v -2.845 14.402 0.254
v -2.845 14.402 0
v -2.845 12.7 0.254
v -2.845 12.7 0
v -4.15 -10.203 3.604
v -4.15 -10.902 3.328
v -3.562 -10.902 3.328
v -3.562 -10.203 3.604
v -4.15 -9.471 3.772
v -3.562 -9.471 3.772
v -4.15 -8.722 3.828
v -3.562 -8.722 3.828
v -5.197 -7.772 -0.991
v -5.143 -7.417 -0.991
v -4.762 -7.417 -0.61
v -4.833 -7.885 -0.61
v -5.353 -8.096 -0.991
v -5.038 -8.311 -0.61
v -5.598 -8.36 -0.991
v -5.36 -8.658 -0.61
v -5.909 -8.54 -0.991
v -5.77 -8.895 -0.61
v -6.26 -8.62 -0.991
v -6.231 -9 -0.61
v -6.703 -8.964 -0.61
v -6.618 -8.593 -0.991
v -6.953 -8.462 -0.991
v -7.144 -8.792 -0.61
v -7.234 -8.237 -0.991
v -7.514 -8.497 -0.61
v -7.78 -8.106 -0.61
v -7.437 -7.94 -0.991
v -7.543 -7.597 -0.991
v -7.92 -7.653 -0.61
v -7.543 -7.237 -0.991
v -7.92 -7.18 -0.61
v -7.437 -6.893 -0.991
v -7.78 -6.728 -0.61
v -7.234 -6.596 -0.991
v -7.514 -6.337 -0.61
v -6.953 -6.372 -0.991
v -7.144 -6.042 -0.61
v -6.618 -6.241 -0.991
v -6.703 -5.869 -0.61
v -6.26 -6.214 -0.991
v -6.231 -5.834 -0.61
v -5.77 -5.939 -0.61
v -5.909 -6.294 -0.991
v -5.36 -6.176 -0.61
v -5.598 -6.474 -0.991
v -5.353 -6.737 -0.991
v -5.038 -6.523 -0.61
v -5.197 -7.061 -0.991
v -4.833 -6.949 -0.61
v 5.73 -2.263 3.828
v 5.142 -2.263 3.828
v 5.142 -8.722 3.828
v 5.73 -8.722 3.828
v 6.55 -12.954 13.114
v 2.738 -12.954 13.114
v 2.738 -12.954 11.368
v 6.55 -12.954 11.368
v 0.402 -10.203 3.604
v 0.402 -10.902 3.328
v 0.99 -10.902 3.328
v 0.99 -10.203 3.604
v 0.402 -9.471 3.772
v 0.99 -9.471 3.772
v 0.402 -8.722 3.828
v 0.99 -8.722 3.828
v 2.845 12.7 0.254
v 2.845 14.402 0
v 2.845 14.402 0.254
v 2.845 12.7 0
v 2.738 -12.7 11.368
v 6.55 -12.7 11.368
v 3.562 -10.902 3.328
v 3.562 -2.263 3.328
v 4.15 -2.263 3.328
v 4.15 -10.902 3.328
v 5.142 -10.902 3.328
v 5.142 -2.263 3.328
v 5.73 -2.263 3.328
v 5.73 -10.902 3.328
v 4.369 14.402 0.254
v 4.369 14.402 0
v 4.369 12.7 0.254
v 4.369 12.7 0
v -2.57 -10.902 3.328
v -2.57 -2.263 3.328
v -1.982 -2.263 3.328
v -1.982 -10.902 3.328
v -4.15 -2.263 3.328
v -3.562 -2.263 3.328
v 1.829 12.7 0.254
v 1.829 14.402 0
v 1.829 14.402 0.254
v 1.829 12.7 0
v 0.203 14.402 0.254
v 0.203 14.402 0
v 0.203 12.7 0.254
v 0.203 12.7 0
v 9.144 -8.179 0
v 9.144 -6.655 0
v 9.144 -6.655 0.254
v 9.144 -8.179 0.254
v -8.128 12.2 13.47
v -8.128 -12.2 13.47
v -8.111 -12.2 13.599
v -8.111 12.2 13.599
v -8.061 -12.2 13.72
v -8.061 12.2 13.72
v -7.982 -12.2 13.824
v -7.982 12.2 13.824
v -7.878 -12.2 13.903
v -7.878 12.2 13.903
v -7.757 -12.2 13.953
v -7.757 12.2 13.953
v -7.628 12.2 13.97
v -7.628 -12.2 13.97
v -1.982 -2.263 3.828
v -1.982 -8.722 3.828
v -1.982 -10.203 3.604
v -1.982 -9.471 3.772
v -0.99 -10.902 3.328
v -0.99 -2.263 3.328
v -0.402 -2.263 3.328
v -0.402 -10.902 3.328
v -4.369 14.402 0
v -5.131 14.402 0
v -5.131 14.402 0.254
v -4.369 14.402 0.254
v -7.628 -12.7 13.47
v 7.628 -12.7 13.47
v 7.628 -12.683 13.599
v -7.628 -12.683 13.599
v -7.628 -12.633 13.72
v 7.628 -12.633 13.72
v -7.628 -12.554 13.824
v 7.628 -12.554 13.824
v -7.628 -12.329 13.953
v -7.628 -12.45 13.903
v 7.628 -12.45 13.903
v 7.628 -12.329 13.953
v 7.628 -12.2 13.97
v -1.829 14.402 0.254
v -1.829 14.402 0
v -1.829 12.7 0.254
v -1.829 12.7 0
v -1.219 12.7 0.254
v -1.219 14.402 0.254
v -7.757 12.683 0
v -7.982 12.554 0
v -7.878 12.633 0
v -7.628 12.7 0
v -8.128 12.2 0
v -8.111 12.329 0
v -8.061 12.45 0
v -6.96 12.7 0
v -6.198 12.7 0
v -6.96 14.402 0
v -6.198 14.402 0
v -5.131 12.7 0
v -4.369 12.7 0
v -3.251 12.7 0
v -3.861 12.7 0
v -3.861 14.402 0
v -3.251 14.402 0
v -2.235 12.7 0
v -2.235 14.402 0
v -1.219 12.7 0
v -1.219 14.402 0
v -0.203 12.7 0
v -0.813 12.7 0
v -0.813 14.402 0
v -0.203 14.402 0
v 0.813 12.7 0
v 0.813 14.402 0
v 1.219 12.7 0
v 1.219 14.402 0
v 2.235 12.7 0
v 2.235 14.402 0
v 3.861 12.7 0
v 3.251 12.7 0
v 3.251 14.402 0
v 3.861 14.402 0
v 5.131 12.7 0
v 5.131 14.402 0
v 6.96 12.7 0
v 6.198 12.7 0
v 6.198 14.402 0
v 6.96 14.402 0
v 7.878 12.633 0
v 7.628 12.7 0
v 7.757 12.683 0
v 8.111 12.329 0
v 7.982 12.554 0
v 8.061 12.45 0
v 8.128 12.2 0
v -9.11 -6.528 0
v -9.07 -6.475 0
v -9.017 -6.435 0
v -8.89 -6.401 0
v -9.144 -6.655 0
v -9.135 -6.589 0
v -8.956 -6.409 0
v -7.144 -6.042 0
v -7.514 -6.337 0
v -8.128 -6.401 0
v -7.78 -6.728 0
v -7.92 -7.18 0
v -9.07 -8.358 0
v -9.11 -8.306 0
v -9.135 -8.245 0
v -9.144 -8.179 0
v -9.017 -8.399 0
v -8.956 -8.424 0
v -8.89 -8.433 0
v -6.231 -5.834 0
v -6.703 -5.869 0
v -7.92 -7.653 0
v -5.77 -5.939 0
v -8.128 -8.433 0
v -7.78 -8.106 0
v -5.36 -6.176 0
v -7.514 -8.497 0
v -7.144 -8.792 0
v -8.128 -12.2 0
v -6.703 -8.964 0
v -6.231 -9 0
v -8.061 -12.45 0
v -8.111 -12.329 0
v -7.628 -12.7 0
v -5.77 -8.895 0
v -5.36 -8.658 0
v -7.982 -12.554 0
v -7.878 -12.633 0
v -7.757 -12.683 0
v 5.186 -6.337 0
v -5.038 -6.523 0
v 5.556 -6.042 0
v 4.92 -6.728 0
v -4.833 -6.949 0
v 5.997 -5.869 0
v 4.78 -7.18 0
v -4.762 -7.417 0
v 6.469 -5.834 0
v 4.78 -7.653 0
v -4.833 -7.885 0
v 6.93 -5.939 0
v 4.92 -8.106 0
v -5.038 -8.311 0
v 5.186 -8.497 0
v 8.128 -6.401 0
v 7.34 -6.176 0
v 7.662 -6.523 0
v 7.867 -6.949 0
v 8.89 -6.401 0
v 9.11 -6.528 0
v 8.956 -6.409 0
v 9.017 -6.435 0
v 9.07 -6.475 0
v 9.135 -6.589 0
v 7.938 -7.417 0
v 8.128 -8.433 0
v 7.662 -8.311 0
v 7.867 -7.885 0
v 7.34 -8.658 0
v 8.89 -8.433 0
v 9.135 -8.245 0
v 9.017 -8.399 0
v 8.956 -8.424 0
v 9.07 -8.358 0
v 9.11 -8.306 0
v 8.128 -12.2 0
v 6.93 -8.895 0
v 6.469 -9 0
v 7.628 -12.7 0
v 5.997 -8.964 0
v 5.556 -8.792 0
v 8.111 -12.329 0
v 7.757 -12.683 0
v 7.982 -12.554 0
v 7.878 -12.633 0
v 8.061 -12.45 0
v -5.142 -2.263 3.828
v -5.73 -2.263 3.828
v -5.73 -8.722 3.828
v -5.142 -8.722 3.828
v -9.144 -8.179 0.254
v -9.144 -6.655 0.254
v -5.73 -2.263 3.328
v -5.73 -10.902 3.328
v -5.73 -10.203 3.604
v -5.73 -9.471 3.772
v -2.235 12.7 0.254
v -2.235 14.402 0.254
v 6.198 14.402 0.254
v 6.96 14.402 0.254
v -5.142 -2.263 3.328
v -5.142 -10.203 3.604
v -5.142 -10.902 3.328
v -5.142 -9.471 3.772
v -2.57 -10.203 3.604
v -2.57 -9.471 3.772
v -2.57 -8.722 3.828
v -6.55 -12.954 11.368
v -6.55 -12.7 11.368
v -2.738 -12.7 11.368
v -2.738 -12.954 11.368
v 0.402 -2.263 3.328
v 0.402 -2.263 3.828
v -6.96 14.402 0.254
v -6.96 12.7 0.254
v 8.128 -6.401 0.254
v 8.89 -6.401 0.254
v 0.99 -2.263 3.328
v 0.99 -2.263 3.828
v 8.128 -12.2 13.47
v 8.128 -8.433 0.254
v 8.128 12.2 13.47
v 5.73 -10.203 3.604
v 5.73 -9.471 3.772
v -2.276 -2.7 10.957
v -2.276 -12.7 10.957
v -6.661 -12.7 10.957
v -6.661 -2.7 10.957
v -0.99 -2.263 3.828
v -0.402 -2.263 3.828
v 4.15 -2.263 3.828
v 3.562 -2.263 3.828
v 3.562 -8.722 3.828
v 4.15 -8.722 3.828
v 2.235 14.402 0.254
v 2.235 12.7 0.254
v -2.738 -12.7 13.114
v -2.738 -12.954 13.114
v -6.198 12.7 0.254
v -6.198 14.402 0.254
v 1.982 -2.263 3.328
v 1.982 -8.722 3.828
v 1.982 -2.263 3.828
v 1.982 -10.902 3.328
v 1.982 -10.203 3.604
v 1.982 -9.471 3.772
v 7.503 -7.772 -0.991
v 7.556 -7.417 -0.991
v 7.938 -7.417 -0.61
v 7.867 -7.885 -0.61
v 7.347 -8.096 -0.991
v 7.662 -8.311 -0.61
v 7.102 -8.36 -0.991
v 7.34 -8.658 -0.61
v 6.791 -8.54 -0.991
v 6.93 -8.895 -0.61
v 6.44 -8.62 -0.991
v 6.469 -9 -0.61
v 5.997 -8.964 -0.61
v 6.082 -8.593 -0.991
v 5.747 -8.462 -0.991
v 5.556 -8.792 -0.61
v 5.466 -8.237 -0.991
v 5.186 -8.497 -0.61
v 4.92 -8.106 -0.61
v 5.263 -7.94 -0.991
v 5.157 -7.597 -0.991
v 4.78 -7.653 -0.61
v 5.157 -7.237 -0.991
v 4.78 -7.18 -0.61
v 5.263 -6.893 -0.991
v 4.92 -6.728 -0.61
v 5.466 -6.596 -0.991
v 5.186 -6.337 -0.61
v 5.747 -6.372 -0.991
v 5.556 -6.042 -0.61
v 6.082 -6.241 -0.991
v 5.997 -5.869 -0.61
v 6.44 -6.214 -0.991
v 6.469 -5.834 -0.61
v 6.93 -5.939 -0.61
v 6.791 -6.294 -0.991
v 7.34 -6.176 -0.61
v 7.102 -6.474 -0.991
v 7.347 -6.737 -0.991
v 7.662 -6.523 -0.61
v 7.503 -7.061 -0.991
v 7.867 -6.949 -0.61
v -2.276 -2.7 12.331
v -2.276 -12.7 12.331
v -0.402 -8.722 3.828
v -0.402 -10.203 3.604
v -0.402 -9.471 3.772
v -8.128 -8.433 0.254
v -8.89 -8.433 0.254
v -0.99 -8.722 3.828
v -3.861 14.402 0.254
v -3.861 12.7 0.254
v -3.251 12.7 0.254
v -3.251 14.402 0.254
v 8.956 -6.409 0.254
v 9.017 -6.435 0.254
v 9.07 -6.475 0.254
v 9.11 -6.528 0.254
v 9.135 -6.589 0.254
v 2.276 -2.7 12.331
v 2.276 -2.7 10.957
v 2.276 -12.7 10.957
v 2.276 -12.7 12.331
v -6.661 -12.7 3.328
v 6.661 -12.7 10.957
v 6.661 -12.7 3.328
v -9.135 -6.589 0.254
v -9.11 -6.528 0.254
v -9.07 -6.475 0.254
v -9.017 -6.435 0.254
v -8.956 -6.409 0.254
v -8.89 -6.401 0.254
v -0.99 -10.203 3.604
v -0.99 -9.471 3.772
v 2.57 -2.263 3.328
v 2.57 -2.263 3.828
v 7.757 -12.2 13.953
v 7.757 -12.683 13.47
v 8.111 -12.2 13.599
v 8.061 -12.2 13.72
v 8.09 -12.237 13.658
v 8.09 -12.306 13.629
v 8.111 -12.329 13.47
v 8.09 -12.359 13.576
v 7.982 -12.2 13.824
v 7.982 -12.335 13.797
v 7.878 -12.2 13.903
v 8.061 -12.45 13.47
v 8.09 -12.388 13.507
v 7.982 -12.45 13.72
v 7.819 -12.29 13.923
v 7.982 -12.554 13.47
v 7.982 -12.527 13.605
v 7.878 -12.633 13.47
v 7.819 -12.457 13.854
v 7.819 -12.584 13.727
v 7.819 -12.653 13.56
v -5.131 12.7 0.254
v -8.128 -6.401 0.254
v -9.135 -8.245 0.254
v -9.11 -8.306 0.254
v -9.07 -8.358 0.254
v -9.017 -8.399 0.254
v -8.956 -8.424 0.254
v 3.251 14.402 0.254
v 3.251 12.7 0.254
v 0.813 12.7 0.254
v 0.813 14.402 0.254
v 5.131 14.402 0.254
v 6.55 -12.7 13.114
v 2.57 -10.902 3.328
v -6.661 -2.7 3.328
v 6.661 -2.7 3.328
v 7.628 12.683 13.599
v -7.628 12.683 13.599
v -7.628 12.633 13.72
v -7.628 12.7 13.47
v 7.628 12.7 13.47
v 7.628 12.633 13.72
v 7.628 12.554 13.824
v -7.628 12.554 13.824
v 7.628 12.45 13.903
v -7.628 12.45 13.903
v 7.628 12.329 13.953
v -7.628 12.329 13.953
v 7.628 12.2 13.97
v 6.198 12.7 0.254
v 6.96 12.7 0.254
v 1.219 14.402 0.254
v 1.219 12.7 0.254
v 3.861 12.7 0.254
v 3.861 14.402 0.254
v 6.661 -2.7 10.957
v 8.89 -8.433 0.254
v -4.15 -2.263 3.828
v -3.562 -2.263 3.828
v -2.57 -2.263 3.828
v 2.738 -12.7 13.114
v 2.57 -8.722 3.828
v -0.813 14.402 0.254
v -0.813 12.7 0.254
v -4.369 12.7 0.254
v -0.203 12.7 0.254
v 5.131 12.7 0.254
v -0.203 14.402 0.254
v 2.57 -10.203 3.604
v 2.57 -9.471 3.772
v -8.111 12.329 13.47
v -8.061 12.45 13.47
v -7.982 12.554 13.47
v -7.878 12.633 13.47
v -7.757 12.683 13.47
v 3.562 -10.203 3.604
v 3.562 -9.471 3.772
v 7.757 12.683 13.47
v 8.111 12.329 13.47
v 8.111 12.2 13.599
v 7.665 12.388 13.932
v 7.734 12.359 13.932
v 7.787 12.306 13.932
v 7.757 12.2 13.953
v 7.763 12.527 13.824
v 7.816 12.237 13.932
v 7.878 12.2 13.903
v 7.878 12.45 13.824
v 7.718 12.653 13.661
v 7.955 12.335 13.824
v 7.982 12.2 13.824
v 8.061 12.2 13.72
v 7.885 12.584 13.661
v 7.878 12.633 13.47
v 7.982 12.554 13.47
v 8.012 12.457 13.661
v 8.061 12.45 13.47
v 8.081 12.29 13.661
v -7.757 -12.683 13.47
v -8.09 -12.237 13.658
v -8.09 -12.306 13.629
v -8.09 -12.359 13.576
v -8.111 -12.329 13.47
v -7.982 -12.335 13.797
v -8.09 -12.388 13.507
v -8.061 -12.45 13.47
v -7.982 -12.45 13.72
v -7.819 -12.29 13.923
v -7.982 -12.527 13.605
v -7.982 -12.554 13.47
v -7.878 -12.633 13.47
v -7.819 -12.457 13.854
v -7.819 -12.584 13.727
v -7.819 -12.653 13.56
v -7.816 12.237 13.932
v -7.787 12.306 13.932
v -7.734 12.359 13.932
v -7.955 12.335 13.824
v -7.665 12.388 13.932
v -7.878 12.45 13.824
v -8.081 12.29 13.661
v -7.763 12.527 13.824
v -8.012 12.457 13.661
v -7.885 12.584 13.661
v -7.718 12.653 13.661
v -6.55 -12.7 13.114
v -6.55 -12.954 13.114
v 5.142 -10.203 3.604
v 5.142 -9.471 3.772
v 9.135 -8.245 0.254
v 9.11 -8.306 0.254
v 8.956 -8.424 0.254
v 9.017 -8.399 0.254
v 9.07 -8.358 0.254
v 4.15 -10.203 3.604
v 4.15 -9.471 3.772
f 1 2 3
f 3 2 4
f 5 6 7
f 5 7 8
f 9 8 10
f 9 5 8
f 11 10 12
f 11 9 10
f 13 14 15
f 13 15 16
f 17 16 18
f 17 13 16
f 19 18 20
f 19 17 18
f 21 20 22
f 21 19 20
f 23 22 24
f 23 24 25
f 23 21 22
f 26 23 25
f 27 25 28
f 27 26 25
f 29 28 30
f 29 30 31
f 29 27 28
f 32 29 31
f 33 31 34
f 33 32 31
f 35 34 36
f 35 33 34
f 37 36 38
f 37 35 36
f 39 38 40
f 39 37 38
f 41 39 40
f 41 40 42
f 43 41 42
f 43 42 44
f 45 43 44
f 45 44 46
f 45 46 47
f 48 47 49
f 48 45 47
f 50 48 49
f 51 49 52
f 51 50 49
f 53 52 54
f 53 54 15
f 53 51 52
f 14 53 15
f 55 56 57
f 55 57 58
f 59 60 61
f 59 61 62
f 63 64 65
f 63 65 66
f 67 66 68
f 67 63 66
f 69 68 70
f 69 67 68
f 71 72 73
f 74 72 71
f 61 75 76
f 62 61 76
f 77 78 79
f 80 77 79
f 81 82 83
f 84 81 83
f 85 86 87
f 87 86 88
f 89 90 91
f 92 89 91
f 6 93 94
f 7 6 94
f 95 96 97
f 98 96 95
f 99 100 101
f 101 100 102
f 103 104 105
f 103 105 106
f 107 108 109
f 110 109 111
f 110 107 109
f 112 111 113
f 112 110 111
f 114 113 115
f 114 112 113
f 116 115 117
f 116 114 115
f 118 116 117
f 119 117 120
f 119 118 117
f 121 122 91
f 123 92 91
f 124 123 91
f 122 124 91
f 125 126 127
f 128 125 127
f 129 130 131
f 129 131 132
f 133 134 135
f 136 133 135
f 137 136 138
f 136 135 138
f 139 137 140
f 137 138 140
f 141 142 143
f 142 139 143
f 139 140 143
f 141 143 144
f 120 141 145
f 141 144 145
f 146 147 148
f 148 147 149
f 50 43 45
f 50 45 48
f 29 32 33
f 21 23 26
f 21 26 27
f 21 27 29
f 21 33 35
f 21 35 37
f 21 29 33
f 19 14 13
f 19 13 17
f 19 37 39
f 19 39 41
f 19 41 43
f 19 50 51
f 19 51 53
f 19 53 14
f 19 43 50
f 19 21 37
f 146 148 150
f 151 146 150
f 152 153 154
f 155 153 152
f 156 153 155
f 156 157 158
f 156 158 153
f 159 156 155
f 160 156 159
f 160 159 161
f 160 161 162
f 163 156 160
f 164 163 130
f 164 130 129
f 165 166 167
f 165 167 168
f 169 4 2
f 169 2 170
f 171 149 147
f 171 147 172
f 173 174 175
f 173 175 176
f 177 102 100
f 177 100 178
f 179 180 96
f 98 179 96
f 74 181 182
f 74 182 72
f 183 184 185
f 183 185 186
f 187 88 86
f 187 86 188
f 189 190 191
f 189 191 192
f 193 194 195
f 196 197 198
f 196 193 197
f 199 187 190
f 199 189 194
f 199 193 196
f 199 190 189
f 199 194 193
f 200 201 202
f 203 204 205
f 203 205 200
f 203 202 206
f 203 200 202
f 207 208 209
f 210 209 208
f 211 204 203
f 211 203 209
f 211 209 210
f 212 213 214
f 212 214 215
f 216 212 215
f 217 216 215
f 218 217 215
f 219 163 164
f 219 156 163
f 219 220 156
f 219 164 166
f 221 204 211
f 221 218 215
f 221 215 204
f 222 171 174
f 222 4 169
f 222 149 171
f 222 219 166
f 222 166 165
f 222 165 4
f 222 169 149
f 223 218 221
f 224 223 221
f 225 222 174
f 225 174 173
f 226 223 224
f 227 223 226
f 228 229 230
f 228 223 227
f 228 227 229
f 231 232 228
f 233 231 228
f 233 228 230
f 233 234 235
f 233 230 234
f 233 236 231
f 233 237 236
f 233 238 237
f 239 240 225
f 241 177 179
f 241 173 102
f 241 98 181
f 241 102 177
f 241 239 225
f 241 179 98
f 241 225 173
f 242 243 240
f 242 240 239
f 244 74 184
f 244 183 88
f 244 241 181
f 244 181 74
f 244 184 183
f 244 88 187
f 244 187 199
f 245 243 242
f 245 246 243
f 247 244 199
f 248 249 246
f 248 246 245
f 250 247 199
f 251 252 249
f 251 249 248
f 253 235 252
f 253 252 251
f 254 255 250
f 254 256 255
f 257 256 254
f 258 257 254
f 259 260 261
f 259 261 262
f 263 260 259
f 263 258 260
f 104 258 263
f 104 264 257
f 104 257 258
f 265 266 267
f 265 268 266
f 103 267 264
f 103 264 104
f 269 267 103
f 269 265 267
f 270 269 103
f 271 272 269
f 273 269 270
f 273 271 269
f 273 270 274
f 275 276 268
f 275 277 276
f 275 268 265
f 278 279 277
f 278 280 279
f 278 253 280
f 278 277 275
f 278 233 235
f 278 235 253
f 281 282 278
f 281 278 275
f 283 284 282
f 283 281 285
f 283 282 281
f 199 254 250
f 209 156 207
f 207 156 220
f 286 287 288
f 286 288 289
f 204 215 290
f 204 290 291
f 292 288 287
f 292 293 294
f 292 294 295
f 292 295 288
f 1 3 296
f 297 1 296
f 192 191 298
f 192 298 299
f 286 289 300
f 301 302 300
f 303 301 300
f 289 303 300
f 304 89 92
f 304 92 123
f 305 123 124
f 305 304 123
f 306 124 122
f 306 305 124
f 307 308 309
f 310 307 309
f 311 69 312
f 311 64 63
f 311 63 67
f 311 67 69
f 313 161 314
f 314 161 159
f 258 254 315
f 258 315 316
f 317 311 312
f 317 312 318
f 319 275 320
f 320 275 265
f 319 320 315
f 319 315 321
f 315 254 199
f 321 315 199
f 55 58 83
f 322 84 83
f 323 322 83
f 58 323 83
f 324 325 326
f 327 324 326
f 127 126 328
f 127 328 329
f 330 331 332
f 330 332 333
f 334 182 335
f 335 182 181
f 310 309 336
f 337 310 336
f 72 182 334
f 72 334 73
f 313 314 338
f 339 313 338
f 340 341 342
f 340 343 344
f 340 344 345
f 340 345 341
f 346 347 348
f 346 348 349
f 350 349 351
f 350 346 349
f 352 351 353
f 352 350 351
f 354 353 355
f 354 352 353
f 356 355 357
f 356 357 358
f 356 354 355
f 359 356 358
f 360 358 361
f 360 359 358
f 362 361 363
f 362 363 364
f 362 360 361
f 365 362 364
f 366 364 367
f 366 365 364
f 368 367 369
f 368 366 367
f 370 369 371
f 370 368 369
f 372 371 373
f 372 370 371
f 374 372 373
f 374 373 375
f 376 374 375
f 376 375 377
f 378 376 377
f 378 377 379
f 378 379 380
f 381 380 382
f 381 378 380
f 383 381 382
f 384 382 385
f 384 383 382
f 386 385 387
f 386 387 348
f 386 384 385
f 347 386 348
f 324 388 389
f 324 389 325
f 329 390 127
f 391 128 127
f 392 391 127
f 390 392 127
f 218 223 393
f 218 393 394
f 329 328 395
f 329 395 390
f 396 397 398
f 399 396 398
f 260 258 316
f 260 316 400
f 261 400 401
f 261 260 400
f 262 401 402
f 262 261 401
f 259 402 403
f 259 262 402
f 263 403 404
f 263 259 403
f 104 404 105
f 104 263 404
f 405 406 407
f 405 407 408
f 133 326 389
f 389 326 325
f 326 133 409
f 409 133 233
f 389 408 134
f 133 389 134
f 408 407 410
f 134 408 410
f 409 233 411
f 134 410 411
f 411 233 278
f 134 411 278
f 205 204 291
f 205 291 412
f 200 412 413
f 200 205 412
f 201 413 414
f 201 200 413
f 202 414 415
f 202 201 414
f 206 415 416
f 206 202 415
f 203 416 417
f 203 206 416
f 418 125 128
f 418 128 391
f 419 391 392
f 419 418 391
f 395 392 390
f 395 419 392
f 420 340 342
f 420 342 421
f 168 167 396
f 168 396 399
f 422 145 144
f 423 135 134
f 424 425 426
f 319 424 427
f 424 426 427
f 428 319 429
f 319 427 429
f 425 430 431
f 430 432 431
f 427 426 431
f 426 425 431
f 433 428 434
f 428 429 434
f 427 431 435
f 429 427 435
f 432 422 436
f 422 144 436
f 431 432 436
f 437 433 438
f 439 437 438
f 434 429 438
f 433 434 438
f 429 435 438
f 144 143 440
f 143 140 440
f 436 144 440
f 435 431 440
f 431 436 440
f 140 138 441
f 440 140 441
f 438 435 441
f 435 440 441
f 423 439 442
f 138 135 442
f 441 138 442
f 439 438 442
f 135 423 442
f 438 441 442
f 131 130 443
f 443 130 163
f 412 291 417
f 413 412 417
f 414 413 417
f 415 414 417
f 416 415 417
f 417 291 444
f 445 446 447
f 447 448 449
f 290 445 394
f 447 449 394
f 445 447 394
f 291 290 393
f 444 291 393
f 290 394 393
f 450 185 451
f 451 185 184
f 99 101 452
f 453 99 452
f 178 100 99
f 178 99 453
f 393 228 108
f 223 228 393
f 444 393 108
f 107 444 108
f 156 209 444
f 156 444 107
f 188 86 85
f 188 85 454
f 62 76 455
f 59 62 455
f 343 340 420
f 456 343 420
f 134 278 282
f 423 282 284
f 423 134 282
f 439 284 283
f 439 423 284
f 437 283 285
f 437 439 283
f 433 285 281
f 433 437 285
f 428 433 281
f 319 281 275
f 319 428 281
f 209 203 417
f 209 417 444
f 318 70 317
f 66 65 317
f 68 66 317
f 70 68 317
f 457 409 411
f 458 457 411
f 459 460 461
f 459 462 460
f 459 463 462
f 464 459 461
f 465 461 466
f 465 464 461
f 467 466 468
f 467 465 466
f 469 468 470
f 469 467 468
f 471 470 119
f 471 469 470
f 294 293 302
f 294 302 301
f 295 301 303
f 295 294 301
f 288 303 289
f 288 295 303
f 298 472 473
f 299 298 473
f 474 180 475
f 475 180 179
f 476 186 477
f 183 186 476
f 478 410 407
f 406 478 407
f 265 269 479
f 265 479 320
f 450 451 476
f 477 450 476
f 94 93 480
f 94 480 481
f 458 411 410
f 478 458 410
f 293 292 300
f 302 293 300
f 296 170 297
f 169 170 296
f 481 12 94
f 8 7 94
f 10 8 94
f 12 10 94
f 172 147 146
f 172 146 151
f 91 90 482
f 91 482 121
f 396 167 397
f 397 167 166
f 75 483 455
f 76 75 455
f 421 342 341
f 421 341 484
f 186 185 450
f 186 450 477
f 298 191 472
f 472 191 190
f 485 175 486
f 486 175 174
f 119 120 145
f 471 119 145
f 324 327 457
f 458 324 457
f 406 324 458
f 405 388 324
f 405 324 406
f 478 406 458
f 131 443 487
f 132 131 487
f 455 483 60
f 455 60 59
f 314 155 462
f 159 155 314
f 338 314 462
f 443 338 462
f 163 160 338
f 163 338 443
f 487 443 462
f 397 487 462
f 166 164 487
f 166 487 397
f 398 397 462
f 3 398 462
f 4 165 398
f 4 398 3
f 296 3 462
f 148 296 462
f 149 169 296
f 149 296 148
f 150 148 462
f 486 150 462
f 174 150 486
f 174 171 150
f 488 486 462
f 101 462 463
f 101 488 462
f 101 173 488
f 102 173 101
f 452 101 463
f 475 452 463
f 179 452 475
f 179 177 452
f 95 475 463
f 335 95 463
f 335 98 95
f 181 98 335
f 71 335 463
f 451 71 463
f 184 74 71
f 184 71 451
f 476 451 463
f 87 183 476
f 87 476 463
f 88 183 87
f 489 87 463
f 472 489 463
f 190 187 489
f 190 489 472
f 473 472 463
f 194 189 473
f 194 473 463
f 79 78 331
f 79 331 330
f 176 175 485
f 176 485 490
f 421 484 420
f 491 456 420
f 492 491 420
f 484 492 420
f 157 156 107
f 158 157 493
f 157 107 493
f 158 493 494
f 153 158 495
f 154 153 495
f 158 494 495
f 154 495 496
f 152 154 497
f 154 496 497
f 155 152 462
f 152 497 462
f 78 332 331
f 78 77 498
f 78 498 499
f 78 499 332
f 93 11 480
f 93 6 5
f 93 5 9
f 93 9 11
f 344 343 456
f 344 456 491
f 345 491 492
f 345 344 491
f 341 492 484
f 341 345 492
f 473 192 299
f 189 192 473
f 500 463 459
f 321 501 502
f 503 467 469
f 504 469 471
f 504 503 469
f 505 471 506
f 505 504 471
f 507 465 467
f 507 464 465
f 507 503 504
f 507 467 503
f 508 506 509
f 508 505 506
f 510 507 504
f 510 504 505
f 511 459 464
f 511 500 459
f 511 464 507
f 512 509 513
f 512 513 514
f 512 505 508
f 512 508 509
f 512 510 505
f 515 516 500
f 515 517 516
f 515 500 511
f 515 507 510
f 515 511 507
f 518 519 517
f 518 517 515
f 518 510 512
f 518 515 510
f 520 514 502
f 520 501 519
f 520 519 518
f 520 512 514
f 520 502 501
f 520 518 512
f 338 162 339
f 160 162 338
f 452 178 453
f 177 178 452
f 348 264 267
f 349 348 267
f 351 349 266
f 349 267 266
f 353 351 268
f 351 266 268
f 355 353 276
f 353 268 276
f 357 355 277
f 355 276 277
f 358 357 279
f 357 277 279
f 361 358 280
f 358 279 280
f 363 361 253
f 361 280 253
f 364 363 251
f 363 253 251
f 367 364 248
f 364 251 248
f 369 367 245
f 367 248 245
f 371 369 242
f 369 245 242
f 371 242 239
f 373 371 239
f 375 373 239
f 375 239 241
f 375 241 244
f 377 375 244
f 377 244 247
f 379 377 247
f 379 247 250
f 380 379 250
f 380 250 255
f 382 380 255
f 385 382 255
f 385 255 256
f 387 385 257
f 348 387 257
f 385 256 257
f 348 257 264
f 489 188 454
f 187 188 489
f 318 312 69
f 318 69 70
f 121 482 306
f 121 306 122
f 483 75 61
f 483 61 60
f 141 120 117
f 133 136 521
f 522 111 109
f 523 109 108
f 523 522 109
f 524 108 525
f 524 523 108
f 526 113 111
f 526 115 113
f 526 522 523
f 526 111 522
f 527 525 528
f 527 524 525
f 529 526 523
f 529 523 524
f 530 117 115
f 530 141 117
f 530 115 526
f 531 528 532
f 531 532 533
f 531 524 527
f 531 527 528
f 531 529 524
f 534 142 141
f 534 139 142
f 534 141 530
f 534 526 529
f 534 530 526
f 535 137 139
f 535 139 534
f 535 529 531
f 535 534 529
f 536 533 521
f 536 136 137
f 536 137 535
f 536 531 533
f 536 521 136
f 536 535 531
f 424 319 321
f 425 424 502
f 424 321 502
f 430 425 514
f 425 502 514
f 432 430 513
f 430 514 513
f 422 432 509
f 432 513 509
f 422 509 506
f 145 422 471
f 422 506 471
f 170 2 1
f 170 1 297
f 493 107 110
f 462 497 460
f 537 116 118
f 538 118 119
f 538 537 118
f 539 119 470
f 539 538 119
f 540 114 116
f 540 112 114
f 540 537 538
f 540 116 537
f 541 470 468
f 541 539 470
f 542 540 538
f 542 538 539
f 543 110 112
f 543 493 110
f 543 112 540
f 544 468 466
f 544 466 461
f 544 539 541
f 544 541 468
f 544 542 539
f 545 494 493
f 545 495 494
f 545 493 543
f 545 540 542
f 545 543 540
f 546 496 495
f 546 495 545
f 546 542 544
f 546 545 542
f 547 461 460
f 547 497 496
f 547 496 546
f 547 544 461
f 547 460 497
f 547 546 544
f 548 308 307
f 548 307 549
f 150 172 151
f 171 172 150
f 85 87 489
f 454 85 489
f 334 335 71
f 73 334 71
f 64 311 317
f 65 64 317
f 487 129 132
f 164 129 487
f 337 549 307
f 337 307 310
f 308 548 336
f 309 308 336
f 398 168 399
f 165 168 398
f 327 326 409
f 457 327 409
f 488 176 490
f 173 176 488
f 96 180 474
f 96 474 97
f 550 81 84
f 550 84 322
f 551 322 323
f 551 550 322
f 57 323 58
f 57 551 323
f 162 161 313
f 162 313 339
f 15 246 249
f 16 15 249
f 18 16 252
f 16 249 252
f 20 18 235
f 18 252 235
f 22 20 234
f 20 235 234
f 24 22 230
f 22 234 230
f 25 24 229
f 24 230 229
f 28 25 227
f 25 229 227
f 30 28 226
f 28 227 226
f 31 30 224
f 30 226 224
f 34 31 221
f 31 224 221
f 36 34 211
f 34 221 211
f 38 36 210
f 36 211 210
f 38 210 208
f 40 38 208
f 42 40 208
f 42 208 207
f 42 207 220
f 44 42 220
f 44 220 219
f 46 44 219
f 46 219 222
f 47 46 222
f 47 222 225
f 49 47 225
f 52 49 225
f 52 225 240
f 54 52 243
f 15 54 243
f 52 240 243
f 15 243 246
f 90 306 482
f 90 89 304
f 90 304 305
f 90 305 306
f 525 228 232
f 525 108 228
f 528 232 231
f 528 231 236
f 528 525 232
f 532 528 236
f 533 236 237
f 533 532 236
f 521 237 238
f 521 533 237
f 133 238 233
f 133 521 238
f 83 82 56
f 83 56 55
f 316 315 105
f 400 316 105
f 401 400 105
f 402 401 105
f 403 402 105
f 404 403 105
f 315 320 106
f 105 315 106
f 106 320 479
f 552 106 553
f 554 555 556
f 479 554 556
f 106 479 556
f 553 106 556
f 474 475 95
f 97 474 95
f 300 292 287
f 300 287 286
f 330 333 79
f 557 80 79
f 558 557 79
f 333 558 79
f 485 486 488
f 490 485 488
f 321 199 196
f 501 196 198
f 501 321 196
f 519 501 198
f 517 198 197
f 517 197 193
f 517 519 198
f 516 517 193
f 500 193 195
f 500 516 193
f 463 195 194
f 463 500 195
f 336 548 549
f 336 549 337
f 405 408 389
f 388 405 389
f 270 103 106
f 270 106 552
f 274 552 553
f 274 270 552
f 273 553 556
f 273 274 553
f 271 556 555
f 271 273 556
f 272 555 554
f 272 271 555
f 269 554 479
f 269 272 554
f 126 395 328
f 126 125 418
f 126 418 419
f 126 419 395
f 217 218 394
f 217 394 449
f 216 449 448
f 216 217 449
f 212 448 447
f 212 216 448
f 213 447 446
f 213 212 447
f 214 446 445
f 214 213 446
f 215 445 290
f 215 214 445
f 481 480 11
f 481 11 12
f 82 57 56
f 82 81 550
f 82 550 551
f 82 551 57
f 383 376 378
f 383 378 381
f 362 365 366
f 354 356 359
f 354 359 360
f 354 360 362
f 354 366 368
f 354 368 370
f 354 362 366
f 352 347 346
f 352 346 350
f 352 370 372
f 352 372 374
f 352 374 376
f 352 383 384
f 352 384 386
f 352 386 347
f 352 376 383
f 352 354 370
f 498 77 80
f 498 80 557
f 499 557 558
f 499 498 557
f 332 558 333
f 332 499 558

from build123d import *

# Parameters (mm, degrees)
F0_W          = 16.256
F0_H          = 25.4
F1_DEPTH      = 13.97
F2_R          = 0.5
F4_DEPTH      = 10
F5_W          = 0.5874776107
F5_H          = 8.6386585608
F6_DEPTH      = 0.5
F7_T1_DEPTH   = 11.4847249695
F7_2_T1_DEPTH = 11.4847249695
F7_3_T1_DEPTH = 11.4847249695
F7_4_T1_DEPTH = 11.4847249695
F7_5_T1_DEPTH = 11.4847249695
F7_6_T1_DEPTH = 11.4847249695
F7_7_T1_DEPTH = 11.4847249695
F7_8_T1_DEPTH = 11.4847249695
F8_R          = 1.5875
F9_DEPTH      = 0.9906
F10_W         = 0.6096
F10_H         = 1.778
F10_W_2       = 0.762
F11_DEPTH     = 0.254
F12_W         = 3.8125803694
F12_H         = 1.7465446144
F13_DEPTH     = 0.254
F14_SIZE      = 0.381


# Not quite as in the source:
# - a fillet or chamfer that OpenCascade refuses, or shapes differently, is made with other operations: its cross-section is extruded or revolved along the edge and cut away or added


with BuildPart() as f1:
    # F0 (on Top) → F1 (new body)
    with BuildSketch(Plane.XY):
        Rectangle(F0_W, F0_H)
    extrude(amount=F1_DEPTH)

    # F2
    f2_edges = [f1.edges().sort_by_distance(p)[0] for p in [
        (8.128, 12.7, 6.985),
        (-8.128, 12.7, 6.985),
        (0, -12.7, 13.97),
        (-8.128, 0, 13.97),
        (0, 12.7, 13.97),
        (8.128, 0, 13.97),
        (-8.128, -12.7, 6.985),
        (8.128, -12.7, 6.985),
    ]]
    fillet(f2_edges, radius=F2_R)

    # F3 (on face) → F4 (cut)
    with BuildSketch(Plane.XZ.offset(12.7)):
        Polygon((2.2763202433, 12.331135571), (0, 12.331135571), (-2.2763202433, 12.331135571), (-2.2763202433, 10.9573551454), (-6.6607256886, 10.9573551454), (-6.6607256886, 3.3284908859), (0, 3.3284908859), (6.6607256886, 3.3284908859), (6.6607256886, 10.9573551454), (2.2763202433, 10.9573551454), align=None)
    extrude(amount=-F4_DEPTH, mode=Mode.SUBTRACT)

    # F8 (on face) → F9 (join)
    with BuildSketch(Plane(origin=(0, 0, 0), x_dir=(1, 0, 0), z_dir=(0, 0, -1))):
        with Locations((6.35, 7.4168)):
            Circle(F8_R)
        with Locations((-6.35, 7.4168)):
            Circle(F8_R)
    extrude(amount=F9_DEPTH)

    # F10 (on face) → F11 (join)
    with BuildSketch(Plane(origin=(0, 0, 0), x_dir=(1, 0, 0), z_dir=(0, 0, -1))):
        with Locations((0.508, -13.5128)):
            Rectangle(F10_W, F10_H)
        with Locations((1.524, -13.5128)):
            Rectangle(F10_W, F10_H)
        with Locations((2.54, -13.5128)):
            Rectangle(F10_W, F10_H)
        with Locations((3.556, -13.5128)):
            Rectangle(F10_W, F10_H)
        with Locations((4.7498, -13.5128)):
            Rectangle(F10_W_2, F10_H)
        with Locations((6.5786, -13.5128)):
            Rectangle(F10_W_2, F10_H)
        with Locations((-0.508, -13.5128)):
            Rectangle(F10_W, F10_H)
        with Locations((-2.54, -13.5128)):
            Rectangle(F10_W, F10_H)
        with Locations((-1.524, -13.5128)):
            Rectangle(F10_W, F10_H)
        with Locations((-3.556, -13.5128)):
            Rectangle(F10_W, F10_H)
        with Locations((-4.7498, -13.5128)):
            Rectangle(F10_W_2, F10_H)
        with Locations((-6.5786, -13.5128)):
            Rectangle(F10_W_2, F10_H)
        with BuildLine():
            Line((8.89, 8.4328), (8.128, 8.4328))
            Line((8.128, 8.4328), (8.128, 6.4008))
            Line((8.128, 6.4008), (8.89, 6.4008))
            ThreePointArc((8.89, 6.4008), (9.0696051224, 6.4751948776), (9.144, 6.6548))
            Line((9.144, 6.6548), (9.144, 8.1788))
            ThreePointArc((9.144, 8.1788), (9.0696051224, 8.3584051224), (8.89, 8.4328))
        make_face()
        with BuildLine():
            ThreePointArc((-8.89, 8.4328), (-9.0696051224, 8.3584051224), (-9.144, 8.1788))
            Line((-9.144, 8.1788), (-9.144, 6.6548))
            ThreePointArc((-9.144, 6.6548), (-9.0696051224, 6.4751948776), (-8.89, 6.4008))
            Line((-8.89, 6.4008), (-8.128, 6.4008))
            Line((-8.128, 6.4008), (-8.128, 8.4328))
            Line((-8.128, 8.4328), (-8.89, 8.4328))
        make_face()
    extrude(amount=-F11_DEPTH)

    # F14
    f14_edges = [f1.edges().sort_by_distance(p)[0] for p in [
        (4.7625, -7.4168, -0.9906),
        (-7.9375, -7.4168, -0.9906),
    ]]
    chamfer(f14_edges, length=F14_SIZE)


with BuildPart() as f6:
    # F5 (on face) → F6 (new body)
    with BuildSketch(Plane.XY.offset(3.3284908859)):
        with Locations((0.6958528975, -6.5825465135)):
            Rectangle(F5_W, F5_H)
    extrude(amount=F6_DEPTH)

    # F7: fillet of radius 5 on 1 edges, made by hand

    # F7_s2 → F7_t1 (cut)
    with BuildSketch(Plane.YZ.offset(-5.0465095873)):
        with BuildLine():
            ThreePointArc((-10.9018757939, 3.3284908859), (-9.8404603109, 3.7018880583), (-8.7224263222, 3.8284908859))
            Line((-8.7224263222, 3.8284908859), (-10.9018757939, 3.8284908859))
            Line((-10.9018757939, 3.8284908859), (-10.9018757939, 3.3284908859))
        make_face()
    extrude(amount=F7_T1_DEPTH, mode=Mode.SUBTRACT)


with BuildPart() as f6b:
    # F5 (on face) → F6, piece 2 (new body)
    with BuildSketch(Plane.XY.offset(3.3284908859)):
        with Locations((2.2758528975, -6.5825465135)):
            Rectangle(F5_W, F5_H)
    extrude(amount=F6_DEPTH)

    # F7#2: fillet of radius 5 on 1 edges, made by hand

    # F7_2_s2 → F7_2_t1 (cut)
    with BuildSketch(Plane.YZ.offset(-3.4665095873)):
        with BuildLine():
            ThreePointArc((-10.9018757939, 3.3284908859), (-9.8404603109, 3.7018880583), (-8.7224263222, 3.8284908859))
            Line((-8.7224263222, 3.8284908859), (-10.9018757939, 3.8284908859))
            Line((-10.9018757939, 3.8284908859), (-10.9018757939, 3.3284908859))
        make_face()
    extrude(amount=F7_2_T1_DEPTH, mode=Mode.SUBTRACT)


with BuildPart() as f6c:
    # F5 (on face) → F6, piece 3 (new body)
    with BuildSketch(Plane.XY.offset(3.3284908859)):
        with Locations((3.8558528975, -6.5825465135)):
            Rectangle(F5_W, F5_H)
    extrude(amount=F6_DEPTH)

    # F7#3: fillet of radius 5 on 1 edges, made by hand

    # F7_3_s2 → F7_3_t1 (cut)
    with BuildSketch(Plane.YZ.offset(-1.8865095873)):
        with BuildLine():
            ThreePointArc((-10.9018757939, 3.3284908859), (-9.8404603109, 3.7018880583), (-8.7224263222, 3.8284908859))
            Line((-8.7224263222, 3.8284908859), (-10.9018757939, 3.8284908859))
            Line((-10.9018757939, 3.8284908859), (-10.9018757939, 3.3284908859))
        make_face()
    extrude(amount=F7_3_T1_DEPTH, mode=Mode.SUBTRACT)


with BuildPart() as f6d:
    # F5 (on face) → F6, piece 4 (new body)
    with BuildSketch(Plane.XY.offset(3.3284908859)):
        with Locations((5.4358528975, -6.5825465135)):
            Rectangle(F5_W, F5_H)
    extrude(amount=F6_DEPTH)

    # F7#4: fillet of radius 5 on 1 edges, made by hand

    # F7_4_s2 → F7_4_t1 (cut)
    with BuildSketch(Plane.YZ.offset(-0.3065095873)):
        with BuildLine():
            ThreePointArc((-10.9018757939, 3.3284908859), (-9.8404603109, 3.7018880583), (-8.7224263222, 3.8284908859))
            Line((-8.7224263222, 3.8284908859), (-10.9018757939, 3.8284908859))
            Line((-10.9018757939, 3.8284908859), (-10.9018757939, 3.3284908859))
        make_face()
    extrude(amount=F7_4_T1_DEPTH, mode=Mode.SUBTRACT)


with BuildPart() as f6e:
    # F5 (on face) → F6, piece 5 (new body)
    with BuildSketch(Plane.XY.offset(3.3284908859)):
        with Locations((-0.6958528975, -6.5825465135)):
            Rectangle(F5_W, F5_H)
    extrude(amount=F6_DEPTH)

    # F7#5: fillet of radius 5 on 1 edges, made by hand

    # F7_5_s2 → F7_5_t1 (cut)
    with BuildSketch(Plane.YZ.offset(-6.4382153822)):
        with BuildLine():
            ThreePointArc((-10.9018757939, 3.3284908859), (-9.8404603109, 3.7018880583), (-8.7224263222, 3.8284908859))
            Line((-8.7224263222, 3.8284908859), (-10.9018757939, 3.8284908859))
            Line((-10.9018757939, 3.8284908859), (-10.9018757939, 3.3284908859))
        make_face()
    extrude(amount=F7_5_T1_DEPTH, mode=Mode.SUBTRACT)


with BuildPart() as f6f:
    # F5 (on face) → F6, piece 6 (new body)
    with BuildSketch(Plane.XY.offset(3.3284908859)):
        with Locations((-3.8558528975, -6.5825465135)):
            Rectangle(F5_W, F5_H)
    extrude(amount=F6_DEPTH)

    # F7#6: fillet of radius 5 on 1 edges, made by hand

    # F7_6_s2 → F7_6_t1 (cut)
    with BuildSketch(Plane.YZ.offset(-9.5982153822)):
        with BuildLine():
            ThreePointArc((-10.9018757939, 3.3284908859), (-9.8404603109, 3.7018880583), (-8.7224263222, 3.8284908859))
            Line((-8.7224263222, 3.8284908859), (-10.9018757939, 3.8284908859))
            Line((-10.9018757939, 3.8284908859), (-10.9018757939, 3.3284908859))
        make_face()
    extrude(amount=F7_6_T1_DEPTH, mode=Mode.SUBTRACT)


with BuildPart() as f6g:
    # F5 (on face) → F6, piece 7 (new body)
    with BuildSketch(Plane.XY.offset(3.3284908859)):
        with Locations((-2.2758528975, -6.5825465135)):
            Rectangle(F5_W, F5_H)
    extrude(amount=F6_DEPTH)

    # F7#7: fillet of radius 5 on 1 edges, made by hand

    # F7_7_s2 → F7_7_t1 (cut)
    with BuildSketch(Plane.YZ.offset(-8.0182153822)):
        with BuildLine():
            ThreePointArc((-10.9018757939, 3.3284908859), (-9.8404603109, 3.7018880583), (-8.7224263222, 3.8284908859))
            Line((-8.7224263222, 3.8284908859), (-10.9018757939, 3.8284908859))
            Line((-10.9018757939, 3.8284908859), (-10.9018757939, 3.3284908859))
        make_face()
    extrude(amount=F7_7_T1_DEPTH, mode=Mode.SUBTRACT)


with BuildPart() as f6h:
    # F5 (on face) → F6, piece 8 (new body)
    with BuildSketch(Plane.XY.offset(3.3284908859)):
        with Locations((-5.4358528975, -6.5825465135)):
            Rectangle(F5_W, F5_H)
    extrude(amount=F6_DEPTH)

    # F7#8: fillet of radius 5 on 1 edges, made by hand

    # F7_8_s2 → F7_8_t1 (cut)
    with BuildSketch(Plane.YZ.offset(-11.1782153822)):
        with BuildLine():
            ThreePointArc((-10.9018757939, 3.3284908859), (-9.8404603109, 3.7018880583), (-8.7224263222, 3.8284908859))
            Line((-8.7224263222, 3.8284908859), (-10.9018757939, 3.8284908859))
            Line((-10.9018757939, 3.8284908859), (-10.9018757939, 3.3284908859))
        make_face()
    extrude(amount=F7_8_T1_DEPTH, mode=Mode.SUBTRACT)


with BuildPart() as f13:
    # F12 (on face) → F13 (new body)
    with BuildSketch(Plane.XZ.offset(12.7)):
        with Locations((-4.6439180151, 12.2411930934)):
            Rectangle(F12_W, F12_H)
    extrude(amount=F13_DEPTH)


with BuildPart() as f13b:
    # F12 (on face) → F13, piece 2 (new body)
    with BuildSketch(Plane.XZ.offset(12.7)):
        with Locations((4.6439180151, 12.2411930934)):
            Rectangle(F12_W, F12_H)
    extrude(amount=F13_DEPTH)


solid = Compound([f1.part, f6.part, f6b.part, f6c.part, f6d.part, f6e.part, f6f.part, f6g.part, f6h.part, f13.part, f13b.part])
